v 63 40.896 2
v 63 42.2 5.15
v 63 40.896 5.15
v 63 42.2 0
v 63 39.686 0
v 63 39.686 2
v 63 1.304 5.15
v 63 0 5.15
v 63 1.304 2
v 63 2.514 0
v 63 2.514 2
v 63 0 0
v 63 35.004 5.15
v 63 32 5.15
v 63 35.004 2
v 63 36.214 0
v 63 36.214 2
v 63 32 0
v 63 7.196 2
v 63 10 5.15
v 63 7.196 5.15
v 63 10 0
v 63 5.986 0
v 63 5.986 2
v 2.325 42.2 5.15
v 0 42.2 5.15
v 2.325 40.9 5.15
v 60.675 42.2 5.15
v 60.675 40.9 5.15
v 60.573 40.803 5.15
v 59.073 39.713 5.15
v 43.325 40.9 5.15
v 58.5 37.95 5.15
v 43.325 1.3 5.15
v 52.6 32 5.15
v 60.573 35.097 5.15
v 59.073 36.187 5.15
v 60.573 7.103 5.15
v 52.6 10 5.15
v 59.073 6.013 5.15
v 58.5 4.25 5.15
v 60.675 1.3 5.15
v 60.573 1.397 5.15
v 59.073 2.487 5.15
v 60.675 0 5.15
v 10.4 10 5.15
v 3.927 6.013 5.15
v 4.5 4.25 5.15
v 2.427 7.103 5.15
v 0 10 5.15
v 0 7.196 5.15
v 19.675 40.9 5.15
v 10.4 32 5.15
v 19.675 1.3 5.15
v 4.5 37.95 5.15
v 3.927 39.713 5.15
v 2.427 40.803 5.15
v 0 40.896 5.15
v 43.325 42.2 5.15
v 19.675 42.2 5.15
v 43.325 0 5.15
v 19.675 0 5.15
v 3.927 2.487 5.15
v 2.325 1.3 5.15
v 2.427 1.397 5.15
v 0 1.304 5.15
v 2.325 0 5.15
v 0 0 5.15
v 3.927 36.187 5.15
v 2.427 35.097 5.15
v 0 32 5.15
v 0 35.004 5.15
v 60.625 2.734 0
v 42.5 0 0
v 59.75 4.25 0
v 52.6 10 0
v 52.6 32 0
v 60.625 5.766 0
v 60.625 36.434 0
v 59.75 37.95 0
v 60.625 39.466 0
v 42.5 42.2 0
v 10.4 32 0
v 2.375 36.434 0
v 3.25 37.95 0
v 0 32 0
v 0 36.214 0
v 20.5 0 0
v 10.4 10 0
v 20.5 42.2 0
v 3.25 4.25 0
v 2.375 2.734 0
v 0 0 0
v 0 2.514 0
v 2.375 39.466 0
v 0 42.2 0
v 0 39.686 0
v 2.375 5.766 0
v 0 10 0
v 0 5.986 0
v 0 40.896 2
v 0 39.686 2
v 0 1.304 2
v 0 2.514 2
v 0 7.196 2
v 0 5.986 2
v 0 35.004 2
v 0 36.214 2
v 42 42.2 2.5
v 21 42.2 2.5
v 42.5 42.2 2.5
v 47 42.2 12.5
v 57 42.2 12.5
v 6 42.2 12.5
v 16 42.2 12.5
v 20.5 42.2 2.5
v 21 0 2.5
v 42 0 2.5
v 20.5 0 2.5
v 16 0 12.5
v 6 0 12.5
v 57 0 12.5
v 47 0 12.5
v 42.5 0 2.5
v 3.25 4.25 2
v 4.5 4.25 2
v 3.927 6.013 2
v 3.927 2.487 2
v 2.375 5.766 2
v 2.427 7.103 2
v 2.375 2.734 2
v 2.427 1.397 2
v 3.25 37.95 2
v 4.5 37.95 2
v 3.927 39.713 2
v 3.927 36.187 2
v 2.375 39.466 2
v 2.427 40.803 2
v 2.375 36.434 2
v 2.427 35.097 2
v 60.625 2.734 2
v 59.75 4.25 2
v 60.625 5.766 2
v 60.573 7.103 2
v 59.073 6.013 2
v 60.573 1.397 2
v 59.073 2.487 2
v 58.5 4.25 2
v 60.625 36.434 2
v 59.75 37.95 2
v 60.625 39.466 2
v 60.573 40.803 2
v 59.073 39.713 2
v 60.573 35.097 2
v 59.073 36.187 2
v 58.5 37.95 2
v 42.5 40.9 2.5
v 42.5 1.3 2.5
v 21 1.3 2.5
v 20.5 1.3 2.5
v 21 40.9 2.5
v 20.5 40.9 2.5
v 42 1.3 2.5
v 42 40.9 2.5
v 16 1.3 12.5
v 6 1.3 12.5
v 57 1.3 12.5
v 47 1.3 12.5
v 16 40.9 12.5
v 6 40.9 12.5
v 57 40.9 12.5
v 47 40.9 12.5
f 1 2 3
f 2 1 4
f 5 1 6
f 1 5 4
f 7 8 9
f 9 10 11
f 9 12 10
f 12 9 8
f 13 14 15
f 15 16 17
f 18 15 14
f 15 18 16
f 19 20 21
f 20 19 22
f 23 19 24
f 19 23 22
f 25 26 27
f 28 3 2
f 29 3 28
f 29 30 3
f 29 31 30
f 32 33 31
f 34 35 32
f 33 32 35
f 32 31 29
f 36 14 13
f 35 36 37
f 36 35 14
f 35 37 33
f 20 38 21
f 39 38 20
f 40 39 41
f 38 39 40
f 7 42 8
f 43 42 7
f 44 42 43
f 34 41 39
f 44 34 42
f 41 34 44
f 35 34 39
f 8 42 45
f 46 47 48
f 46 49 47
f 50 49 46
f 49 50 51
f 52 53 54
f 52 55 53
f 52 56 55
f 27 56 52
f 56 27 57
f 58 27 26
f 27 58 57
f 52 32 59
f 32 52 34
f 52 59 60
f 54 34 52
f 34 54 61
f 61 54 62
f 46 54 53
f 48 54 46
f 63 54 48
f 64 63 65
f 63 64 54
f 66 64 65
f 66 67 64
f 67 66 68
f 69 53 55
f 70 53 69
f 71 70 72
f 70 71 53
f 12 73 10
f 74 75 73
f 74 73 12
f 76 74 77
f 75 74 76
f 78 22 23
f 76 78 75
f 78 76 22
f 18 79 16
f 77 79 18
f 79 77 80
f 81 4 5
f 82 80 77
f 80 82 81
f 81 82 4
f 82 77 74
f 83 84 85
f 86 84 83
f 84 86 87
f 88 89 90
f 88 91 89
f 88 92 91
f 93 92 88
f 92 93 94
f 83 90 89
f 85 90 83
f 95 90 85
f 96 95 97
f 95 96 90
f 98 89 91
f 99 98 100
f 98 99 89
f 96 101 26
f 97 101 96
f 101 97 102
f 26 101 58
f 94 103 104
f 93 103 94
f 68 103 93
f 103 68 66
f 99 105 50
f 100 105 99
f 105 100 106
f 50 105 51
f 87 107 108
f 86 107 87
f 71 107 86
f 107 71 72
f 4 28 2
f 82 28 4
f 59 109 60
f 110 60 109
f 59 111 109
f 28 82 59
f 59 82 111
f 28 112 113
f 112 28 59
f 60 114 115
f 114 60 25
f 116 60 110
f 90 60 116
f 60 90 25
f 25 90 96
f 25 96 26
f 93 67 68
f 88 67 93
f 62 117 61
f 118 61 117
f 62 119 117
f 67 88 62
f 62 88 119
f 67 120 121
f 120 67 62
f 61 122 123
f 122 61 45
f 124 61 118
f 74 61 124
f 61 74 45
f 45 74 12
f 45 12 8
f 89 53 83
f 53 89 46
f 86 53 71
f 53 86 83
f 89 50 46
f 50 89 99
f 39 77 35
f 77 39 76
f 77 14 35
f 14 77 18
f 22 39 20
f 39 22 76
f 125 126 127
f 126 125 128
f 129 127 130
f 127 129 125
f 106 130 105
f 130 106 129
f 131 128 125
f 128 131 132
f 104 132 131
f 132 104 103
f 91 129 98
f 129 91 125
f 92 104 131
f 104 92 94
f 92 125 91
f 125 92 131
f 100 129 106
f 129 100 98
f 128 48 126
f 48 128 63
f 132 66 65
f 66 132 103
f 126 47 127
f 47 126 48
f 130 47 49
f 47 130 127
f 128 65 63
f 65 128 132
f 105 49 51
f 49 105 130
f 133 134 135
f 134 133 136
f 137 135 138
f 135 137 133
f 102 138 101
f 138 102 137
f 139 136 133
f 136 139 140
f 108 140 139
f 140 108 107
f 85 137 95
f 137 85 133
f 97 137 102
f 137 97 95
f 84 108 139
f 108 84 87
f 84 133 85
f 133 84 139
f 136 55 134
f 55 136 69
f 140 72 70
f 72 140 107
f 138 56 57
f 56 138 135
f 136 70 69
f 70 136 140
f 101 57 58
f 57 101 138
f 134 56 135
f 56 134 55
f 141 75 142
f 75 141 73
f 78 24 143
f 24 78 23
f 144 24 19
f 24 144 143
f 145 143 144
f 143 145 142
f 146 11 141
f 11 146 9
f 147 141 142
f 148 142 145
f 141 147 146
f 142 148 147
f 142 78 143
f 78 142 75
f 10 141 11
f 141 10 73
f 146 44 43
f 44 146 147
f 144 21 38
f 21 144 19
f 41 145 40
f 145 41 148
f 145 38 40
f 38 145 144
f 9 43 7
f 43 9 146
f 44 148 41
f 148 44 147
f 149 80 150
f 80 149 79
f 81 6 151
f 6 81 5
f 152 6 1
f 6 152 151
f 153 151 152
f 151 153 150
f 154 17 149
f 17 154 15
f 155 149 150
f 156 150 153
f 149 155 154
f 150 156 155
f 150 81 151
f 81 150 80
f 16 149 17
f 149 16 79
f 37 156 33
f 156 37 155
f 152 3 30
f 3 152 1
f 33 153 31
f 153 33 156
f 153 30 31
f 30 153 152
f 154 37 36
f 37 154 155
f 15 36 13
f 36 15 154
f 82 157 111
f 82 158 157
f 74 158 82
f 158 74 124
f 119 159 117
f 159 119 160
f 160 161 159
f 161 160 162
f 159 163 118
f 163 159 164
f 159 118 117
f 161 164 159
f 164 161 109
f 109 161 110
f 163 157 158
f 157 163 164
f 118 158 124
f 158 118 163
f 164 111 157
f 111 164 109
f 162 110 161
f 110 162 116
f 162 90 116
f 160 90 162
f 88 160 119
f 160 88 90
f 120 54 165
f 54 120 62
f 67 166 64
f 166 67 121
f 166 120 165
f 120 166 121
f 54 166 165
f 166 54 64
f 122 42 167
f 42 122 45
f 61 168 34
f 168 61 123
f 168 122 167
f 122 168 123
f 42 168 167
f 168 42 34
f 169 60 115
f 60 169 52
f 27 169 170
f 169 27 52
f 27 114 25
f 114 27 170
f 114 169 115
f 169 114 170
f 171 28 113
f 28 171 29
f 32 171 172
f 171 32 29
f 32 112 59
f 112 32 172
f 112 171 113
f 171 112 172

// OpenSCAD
basePlateLength = 63;
basePlateDepth = 37.2 + 5;
basePlateHeight = 2;

screwHeadHeight = 3.15;
screwHeadDiameter = 6;
screwHeadRadius = screwHeadDiameter / 2;
screwHoleHeight = basePlateHeight;
screwHoleDiameter = 3.5;
screwHoleRadius = screwHoleDiameter / 2;

screwHoleOffsetX = 1.5;
screwHoleOffsetY = screwHoleRadius + 2.5;
holeDistanceMidToMidY = 33.7;
holeDistanceMidToMidX = 60;

main();


module basePlate() {
    difference() {
        cube([basePlateLength, basePlateDepth, basePlateHeight + screwHeadHeight]);
        
        // cable spaces
        translate([0,10,0]) bottomSpace();
        translate([63-10.4,10,0]) bottomSpace();
        
        // screw holes
        translate([screwHoleOffsetX, screwHoleOffsetY, 0]) #screwHole(screwHoleDiameter, screwHoleHeight);
        translate([screwHoleOffsetX, screwHoleOffsetY, basePlateHeight]) #screwHole(screwHeadDiameter, screwHeadHeight);

        translate([screwHoleOffsetX, screwHoleOffsetY  + holeDistanceMidToMidY, 0]) #screwHole(screwHoleDiameter, screwHoleHeight);
        translate([screwHoleOffsetX, screwHoleOffsetY + holeDistanceMidToMidY, basePlateHeight]) #screwHole(screwHeadDiameter, screwHeadHeight);
        
        translate([screwHoleOffsetX + holeDistanceMidToMidX, screwHoleOffsetY, 0]) rotate(180) #screwHole(screwHoleDiameter, screwHoleHeight);
        translate([screwHoleOffsetX + holeDistanceMidToMidX, screwHoleOffsetY, basePlateHeight]) rotate(180) #screwHole(screwHeadDiameter, screwHeadHeight);
        
        translate([screwHoleOffsetX + holeDistanceMidToMidX, screwHoleOffsetY  + holeDistanceMidToMidY, 0]) rotate(180) #screwHole(screwHoleDiameter, screwHoleHeight);
        translate([screwHoleOffsetX + holeDistanceMidToMidX, screwHoleOffsetY + holeDistanceMidToMidY, basePlateHeight]) rotate(180) #screwHole(screwHeadDiameter, screwHeadHeight);
    }
}

module screwHole(diameter, height) {
    radius = diameter / 2;
    hull() {
        cylinder(d = diameter, h = height);
        translate([-radius, -radius, 0]) cube([0.1, diameter, height]);
    }
}

module sideHolder() {
    rotate(90, [1,0,0]) translate([0,0,-1.3]) linear_extrude(height=1.3) {
        polygon(points=[[0, 0], [5, 10], [15, 10], [20, 0]]);
    }
}

module strapHole() {
    cube([22, basePlateDepth, 2.5]);
}

module bottomSpace() {
    cube([10.4,22,5.2]);
}

module main() {
    difference() {
        basePlate();
        translate([20.5, 0, 0]) strapHole();
    }

    sideHolderOffsetZ = 2.5;

    translate([1, 0, sideHolderOffsetZ]) sideHolder();    
    translate([42, 0, sideHolderOffsetZ]) sideHolder();
    
    translate([1, basePlateDepth - 1.3, sideHolderOffsetZ]) sideHolder();
    translate([42, basePlateDepth - 1.3, sideHolderOffsetZ]) sideHolder();
}
